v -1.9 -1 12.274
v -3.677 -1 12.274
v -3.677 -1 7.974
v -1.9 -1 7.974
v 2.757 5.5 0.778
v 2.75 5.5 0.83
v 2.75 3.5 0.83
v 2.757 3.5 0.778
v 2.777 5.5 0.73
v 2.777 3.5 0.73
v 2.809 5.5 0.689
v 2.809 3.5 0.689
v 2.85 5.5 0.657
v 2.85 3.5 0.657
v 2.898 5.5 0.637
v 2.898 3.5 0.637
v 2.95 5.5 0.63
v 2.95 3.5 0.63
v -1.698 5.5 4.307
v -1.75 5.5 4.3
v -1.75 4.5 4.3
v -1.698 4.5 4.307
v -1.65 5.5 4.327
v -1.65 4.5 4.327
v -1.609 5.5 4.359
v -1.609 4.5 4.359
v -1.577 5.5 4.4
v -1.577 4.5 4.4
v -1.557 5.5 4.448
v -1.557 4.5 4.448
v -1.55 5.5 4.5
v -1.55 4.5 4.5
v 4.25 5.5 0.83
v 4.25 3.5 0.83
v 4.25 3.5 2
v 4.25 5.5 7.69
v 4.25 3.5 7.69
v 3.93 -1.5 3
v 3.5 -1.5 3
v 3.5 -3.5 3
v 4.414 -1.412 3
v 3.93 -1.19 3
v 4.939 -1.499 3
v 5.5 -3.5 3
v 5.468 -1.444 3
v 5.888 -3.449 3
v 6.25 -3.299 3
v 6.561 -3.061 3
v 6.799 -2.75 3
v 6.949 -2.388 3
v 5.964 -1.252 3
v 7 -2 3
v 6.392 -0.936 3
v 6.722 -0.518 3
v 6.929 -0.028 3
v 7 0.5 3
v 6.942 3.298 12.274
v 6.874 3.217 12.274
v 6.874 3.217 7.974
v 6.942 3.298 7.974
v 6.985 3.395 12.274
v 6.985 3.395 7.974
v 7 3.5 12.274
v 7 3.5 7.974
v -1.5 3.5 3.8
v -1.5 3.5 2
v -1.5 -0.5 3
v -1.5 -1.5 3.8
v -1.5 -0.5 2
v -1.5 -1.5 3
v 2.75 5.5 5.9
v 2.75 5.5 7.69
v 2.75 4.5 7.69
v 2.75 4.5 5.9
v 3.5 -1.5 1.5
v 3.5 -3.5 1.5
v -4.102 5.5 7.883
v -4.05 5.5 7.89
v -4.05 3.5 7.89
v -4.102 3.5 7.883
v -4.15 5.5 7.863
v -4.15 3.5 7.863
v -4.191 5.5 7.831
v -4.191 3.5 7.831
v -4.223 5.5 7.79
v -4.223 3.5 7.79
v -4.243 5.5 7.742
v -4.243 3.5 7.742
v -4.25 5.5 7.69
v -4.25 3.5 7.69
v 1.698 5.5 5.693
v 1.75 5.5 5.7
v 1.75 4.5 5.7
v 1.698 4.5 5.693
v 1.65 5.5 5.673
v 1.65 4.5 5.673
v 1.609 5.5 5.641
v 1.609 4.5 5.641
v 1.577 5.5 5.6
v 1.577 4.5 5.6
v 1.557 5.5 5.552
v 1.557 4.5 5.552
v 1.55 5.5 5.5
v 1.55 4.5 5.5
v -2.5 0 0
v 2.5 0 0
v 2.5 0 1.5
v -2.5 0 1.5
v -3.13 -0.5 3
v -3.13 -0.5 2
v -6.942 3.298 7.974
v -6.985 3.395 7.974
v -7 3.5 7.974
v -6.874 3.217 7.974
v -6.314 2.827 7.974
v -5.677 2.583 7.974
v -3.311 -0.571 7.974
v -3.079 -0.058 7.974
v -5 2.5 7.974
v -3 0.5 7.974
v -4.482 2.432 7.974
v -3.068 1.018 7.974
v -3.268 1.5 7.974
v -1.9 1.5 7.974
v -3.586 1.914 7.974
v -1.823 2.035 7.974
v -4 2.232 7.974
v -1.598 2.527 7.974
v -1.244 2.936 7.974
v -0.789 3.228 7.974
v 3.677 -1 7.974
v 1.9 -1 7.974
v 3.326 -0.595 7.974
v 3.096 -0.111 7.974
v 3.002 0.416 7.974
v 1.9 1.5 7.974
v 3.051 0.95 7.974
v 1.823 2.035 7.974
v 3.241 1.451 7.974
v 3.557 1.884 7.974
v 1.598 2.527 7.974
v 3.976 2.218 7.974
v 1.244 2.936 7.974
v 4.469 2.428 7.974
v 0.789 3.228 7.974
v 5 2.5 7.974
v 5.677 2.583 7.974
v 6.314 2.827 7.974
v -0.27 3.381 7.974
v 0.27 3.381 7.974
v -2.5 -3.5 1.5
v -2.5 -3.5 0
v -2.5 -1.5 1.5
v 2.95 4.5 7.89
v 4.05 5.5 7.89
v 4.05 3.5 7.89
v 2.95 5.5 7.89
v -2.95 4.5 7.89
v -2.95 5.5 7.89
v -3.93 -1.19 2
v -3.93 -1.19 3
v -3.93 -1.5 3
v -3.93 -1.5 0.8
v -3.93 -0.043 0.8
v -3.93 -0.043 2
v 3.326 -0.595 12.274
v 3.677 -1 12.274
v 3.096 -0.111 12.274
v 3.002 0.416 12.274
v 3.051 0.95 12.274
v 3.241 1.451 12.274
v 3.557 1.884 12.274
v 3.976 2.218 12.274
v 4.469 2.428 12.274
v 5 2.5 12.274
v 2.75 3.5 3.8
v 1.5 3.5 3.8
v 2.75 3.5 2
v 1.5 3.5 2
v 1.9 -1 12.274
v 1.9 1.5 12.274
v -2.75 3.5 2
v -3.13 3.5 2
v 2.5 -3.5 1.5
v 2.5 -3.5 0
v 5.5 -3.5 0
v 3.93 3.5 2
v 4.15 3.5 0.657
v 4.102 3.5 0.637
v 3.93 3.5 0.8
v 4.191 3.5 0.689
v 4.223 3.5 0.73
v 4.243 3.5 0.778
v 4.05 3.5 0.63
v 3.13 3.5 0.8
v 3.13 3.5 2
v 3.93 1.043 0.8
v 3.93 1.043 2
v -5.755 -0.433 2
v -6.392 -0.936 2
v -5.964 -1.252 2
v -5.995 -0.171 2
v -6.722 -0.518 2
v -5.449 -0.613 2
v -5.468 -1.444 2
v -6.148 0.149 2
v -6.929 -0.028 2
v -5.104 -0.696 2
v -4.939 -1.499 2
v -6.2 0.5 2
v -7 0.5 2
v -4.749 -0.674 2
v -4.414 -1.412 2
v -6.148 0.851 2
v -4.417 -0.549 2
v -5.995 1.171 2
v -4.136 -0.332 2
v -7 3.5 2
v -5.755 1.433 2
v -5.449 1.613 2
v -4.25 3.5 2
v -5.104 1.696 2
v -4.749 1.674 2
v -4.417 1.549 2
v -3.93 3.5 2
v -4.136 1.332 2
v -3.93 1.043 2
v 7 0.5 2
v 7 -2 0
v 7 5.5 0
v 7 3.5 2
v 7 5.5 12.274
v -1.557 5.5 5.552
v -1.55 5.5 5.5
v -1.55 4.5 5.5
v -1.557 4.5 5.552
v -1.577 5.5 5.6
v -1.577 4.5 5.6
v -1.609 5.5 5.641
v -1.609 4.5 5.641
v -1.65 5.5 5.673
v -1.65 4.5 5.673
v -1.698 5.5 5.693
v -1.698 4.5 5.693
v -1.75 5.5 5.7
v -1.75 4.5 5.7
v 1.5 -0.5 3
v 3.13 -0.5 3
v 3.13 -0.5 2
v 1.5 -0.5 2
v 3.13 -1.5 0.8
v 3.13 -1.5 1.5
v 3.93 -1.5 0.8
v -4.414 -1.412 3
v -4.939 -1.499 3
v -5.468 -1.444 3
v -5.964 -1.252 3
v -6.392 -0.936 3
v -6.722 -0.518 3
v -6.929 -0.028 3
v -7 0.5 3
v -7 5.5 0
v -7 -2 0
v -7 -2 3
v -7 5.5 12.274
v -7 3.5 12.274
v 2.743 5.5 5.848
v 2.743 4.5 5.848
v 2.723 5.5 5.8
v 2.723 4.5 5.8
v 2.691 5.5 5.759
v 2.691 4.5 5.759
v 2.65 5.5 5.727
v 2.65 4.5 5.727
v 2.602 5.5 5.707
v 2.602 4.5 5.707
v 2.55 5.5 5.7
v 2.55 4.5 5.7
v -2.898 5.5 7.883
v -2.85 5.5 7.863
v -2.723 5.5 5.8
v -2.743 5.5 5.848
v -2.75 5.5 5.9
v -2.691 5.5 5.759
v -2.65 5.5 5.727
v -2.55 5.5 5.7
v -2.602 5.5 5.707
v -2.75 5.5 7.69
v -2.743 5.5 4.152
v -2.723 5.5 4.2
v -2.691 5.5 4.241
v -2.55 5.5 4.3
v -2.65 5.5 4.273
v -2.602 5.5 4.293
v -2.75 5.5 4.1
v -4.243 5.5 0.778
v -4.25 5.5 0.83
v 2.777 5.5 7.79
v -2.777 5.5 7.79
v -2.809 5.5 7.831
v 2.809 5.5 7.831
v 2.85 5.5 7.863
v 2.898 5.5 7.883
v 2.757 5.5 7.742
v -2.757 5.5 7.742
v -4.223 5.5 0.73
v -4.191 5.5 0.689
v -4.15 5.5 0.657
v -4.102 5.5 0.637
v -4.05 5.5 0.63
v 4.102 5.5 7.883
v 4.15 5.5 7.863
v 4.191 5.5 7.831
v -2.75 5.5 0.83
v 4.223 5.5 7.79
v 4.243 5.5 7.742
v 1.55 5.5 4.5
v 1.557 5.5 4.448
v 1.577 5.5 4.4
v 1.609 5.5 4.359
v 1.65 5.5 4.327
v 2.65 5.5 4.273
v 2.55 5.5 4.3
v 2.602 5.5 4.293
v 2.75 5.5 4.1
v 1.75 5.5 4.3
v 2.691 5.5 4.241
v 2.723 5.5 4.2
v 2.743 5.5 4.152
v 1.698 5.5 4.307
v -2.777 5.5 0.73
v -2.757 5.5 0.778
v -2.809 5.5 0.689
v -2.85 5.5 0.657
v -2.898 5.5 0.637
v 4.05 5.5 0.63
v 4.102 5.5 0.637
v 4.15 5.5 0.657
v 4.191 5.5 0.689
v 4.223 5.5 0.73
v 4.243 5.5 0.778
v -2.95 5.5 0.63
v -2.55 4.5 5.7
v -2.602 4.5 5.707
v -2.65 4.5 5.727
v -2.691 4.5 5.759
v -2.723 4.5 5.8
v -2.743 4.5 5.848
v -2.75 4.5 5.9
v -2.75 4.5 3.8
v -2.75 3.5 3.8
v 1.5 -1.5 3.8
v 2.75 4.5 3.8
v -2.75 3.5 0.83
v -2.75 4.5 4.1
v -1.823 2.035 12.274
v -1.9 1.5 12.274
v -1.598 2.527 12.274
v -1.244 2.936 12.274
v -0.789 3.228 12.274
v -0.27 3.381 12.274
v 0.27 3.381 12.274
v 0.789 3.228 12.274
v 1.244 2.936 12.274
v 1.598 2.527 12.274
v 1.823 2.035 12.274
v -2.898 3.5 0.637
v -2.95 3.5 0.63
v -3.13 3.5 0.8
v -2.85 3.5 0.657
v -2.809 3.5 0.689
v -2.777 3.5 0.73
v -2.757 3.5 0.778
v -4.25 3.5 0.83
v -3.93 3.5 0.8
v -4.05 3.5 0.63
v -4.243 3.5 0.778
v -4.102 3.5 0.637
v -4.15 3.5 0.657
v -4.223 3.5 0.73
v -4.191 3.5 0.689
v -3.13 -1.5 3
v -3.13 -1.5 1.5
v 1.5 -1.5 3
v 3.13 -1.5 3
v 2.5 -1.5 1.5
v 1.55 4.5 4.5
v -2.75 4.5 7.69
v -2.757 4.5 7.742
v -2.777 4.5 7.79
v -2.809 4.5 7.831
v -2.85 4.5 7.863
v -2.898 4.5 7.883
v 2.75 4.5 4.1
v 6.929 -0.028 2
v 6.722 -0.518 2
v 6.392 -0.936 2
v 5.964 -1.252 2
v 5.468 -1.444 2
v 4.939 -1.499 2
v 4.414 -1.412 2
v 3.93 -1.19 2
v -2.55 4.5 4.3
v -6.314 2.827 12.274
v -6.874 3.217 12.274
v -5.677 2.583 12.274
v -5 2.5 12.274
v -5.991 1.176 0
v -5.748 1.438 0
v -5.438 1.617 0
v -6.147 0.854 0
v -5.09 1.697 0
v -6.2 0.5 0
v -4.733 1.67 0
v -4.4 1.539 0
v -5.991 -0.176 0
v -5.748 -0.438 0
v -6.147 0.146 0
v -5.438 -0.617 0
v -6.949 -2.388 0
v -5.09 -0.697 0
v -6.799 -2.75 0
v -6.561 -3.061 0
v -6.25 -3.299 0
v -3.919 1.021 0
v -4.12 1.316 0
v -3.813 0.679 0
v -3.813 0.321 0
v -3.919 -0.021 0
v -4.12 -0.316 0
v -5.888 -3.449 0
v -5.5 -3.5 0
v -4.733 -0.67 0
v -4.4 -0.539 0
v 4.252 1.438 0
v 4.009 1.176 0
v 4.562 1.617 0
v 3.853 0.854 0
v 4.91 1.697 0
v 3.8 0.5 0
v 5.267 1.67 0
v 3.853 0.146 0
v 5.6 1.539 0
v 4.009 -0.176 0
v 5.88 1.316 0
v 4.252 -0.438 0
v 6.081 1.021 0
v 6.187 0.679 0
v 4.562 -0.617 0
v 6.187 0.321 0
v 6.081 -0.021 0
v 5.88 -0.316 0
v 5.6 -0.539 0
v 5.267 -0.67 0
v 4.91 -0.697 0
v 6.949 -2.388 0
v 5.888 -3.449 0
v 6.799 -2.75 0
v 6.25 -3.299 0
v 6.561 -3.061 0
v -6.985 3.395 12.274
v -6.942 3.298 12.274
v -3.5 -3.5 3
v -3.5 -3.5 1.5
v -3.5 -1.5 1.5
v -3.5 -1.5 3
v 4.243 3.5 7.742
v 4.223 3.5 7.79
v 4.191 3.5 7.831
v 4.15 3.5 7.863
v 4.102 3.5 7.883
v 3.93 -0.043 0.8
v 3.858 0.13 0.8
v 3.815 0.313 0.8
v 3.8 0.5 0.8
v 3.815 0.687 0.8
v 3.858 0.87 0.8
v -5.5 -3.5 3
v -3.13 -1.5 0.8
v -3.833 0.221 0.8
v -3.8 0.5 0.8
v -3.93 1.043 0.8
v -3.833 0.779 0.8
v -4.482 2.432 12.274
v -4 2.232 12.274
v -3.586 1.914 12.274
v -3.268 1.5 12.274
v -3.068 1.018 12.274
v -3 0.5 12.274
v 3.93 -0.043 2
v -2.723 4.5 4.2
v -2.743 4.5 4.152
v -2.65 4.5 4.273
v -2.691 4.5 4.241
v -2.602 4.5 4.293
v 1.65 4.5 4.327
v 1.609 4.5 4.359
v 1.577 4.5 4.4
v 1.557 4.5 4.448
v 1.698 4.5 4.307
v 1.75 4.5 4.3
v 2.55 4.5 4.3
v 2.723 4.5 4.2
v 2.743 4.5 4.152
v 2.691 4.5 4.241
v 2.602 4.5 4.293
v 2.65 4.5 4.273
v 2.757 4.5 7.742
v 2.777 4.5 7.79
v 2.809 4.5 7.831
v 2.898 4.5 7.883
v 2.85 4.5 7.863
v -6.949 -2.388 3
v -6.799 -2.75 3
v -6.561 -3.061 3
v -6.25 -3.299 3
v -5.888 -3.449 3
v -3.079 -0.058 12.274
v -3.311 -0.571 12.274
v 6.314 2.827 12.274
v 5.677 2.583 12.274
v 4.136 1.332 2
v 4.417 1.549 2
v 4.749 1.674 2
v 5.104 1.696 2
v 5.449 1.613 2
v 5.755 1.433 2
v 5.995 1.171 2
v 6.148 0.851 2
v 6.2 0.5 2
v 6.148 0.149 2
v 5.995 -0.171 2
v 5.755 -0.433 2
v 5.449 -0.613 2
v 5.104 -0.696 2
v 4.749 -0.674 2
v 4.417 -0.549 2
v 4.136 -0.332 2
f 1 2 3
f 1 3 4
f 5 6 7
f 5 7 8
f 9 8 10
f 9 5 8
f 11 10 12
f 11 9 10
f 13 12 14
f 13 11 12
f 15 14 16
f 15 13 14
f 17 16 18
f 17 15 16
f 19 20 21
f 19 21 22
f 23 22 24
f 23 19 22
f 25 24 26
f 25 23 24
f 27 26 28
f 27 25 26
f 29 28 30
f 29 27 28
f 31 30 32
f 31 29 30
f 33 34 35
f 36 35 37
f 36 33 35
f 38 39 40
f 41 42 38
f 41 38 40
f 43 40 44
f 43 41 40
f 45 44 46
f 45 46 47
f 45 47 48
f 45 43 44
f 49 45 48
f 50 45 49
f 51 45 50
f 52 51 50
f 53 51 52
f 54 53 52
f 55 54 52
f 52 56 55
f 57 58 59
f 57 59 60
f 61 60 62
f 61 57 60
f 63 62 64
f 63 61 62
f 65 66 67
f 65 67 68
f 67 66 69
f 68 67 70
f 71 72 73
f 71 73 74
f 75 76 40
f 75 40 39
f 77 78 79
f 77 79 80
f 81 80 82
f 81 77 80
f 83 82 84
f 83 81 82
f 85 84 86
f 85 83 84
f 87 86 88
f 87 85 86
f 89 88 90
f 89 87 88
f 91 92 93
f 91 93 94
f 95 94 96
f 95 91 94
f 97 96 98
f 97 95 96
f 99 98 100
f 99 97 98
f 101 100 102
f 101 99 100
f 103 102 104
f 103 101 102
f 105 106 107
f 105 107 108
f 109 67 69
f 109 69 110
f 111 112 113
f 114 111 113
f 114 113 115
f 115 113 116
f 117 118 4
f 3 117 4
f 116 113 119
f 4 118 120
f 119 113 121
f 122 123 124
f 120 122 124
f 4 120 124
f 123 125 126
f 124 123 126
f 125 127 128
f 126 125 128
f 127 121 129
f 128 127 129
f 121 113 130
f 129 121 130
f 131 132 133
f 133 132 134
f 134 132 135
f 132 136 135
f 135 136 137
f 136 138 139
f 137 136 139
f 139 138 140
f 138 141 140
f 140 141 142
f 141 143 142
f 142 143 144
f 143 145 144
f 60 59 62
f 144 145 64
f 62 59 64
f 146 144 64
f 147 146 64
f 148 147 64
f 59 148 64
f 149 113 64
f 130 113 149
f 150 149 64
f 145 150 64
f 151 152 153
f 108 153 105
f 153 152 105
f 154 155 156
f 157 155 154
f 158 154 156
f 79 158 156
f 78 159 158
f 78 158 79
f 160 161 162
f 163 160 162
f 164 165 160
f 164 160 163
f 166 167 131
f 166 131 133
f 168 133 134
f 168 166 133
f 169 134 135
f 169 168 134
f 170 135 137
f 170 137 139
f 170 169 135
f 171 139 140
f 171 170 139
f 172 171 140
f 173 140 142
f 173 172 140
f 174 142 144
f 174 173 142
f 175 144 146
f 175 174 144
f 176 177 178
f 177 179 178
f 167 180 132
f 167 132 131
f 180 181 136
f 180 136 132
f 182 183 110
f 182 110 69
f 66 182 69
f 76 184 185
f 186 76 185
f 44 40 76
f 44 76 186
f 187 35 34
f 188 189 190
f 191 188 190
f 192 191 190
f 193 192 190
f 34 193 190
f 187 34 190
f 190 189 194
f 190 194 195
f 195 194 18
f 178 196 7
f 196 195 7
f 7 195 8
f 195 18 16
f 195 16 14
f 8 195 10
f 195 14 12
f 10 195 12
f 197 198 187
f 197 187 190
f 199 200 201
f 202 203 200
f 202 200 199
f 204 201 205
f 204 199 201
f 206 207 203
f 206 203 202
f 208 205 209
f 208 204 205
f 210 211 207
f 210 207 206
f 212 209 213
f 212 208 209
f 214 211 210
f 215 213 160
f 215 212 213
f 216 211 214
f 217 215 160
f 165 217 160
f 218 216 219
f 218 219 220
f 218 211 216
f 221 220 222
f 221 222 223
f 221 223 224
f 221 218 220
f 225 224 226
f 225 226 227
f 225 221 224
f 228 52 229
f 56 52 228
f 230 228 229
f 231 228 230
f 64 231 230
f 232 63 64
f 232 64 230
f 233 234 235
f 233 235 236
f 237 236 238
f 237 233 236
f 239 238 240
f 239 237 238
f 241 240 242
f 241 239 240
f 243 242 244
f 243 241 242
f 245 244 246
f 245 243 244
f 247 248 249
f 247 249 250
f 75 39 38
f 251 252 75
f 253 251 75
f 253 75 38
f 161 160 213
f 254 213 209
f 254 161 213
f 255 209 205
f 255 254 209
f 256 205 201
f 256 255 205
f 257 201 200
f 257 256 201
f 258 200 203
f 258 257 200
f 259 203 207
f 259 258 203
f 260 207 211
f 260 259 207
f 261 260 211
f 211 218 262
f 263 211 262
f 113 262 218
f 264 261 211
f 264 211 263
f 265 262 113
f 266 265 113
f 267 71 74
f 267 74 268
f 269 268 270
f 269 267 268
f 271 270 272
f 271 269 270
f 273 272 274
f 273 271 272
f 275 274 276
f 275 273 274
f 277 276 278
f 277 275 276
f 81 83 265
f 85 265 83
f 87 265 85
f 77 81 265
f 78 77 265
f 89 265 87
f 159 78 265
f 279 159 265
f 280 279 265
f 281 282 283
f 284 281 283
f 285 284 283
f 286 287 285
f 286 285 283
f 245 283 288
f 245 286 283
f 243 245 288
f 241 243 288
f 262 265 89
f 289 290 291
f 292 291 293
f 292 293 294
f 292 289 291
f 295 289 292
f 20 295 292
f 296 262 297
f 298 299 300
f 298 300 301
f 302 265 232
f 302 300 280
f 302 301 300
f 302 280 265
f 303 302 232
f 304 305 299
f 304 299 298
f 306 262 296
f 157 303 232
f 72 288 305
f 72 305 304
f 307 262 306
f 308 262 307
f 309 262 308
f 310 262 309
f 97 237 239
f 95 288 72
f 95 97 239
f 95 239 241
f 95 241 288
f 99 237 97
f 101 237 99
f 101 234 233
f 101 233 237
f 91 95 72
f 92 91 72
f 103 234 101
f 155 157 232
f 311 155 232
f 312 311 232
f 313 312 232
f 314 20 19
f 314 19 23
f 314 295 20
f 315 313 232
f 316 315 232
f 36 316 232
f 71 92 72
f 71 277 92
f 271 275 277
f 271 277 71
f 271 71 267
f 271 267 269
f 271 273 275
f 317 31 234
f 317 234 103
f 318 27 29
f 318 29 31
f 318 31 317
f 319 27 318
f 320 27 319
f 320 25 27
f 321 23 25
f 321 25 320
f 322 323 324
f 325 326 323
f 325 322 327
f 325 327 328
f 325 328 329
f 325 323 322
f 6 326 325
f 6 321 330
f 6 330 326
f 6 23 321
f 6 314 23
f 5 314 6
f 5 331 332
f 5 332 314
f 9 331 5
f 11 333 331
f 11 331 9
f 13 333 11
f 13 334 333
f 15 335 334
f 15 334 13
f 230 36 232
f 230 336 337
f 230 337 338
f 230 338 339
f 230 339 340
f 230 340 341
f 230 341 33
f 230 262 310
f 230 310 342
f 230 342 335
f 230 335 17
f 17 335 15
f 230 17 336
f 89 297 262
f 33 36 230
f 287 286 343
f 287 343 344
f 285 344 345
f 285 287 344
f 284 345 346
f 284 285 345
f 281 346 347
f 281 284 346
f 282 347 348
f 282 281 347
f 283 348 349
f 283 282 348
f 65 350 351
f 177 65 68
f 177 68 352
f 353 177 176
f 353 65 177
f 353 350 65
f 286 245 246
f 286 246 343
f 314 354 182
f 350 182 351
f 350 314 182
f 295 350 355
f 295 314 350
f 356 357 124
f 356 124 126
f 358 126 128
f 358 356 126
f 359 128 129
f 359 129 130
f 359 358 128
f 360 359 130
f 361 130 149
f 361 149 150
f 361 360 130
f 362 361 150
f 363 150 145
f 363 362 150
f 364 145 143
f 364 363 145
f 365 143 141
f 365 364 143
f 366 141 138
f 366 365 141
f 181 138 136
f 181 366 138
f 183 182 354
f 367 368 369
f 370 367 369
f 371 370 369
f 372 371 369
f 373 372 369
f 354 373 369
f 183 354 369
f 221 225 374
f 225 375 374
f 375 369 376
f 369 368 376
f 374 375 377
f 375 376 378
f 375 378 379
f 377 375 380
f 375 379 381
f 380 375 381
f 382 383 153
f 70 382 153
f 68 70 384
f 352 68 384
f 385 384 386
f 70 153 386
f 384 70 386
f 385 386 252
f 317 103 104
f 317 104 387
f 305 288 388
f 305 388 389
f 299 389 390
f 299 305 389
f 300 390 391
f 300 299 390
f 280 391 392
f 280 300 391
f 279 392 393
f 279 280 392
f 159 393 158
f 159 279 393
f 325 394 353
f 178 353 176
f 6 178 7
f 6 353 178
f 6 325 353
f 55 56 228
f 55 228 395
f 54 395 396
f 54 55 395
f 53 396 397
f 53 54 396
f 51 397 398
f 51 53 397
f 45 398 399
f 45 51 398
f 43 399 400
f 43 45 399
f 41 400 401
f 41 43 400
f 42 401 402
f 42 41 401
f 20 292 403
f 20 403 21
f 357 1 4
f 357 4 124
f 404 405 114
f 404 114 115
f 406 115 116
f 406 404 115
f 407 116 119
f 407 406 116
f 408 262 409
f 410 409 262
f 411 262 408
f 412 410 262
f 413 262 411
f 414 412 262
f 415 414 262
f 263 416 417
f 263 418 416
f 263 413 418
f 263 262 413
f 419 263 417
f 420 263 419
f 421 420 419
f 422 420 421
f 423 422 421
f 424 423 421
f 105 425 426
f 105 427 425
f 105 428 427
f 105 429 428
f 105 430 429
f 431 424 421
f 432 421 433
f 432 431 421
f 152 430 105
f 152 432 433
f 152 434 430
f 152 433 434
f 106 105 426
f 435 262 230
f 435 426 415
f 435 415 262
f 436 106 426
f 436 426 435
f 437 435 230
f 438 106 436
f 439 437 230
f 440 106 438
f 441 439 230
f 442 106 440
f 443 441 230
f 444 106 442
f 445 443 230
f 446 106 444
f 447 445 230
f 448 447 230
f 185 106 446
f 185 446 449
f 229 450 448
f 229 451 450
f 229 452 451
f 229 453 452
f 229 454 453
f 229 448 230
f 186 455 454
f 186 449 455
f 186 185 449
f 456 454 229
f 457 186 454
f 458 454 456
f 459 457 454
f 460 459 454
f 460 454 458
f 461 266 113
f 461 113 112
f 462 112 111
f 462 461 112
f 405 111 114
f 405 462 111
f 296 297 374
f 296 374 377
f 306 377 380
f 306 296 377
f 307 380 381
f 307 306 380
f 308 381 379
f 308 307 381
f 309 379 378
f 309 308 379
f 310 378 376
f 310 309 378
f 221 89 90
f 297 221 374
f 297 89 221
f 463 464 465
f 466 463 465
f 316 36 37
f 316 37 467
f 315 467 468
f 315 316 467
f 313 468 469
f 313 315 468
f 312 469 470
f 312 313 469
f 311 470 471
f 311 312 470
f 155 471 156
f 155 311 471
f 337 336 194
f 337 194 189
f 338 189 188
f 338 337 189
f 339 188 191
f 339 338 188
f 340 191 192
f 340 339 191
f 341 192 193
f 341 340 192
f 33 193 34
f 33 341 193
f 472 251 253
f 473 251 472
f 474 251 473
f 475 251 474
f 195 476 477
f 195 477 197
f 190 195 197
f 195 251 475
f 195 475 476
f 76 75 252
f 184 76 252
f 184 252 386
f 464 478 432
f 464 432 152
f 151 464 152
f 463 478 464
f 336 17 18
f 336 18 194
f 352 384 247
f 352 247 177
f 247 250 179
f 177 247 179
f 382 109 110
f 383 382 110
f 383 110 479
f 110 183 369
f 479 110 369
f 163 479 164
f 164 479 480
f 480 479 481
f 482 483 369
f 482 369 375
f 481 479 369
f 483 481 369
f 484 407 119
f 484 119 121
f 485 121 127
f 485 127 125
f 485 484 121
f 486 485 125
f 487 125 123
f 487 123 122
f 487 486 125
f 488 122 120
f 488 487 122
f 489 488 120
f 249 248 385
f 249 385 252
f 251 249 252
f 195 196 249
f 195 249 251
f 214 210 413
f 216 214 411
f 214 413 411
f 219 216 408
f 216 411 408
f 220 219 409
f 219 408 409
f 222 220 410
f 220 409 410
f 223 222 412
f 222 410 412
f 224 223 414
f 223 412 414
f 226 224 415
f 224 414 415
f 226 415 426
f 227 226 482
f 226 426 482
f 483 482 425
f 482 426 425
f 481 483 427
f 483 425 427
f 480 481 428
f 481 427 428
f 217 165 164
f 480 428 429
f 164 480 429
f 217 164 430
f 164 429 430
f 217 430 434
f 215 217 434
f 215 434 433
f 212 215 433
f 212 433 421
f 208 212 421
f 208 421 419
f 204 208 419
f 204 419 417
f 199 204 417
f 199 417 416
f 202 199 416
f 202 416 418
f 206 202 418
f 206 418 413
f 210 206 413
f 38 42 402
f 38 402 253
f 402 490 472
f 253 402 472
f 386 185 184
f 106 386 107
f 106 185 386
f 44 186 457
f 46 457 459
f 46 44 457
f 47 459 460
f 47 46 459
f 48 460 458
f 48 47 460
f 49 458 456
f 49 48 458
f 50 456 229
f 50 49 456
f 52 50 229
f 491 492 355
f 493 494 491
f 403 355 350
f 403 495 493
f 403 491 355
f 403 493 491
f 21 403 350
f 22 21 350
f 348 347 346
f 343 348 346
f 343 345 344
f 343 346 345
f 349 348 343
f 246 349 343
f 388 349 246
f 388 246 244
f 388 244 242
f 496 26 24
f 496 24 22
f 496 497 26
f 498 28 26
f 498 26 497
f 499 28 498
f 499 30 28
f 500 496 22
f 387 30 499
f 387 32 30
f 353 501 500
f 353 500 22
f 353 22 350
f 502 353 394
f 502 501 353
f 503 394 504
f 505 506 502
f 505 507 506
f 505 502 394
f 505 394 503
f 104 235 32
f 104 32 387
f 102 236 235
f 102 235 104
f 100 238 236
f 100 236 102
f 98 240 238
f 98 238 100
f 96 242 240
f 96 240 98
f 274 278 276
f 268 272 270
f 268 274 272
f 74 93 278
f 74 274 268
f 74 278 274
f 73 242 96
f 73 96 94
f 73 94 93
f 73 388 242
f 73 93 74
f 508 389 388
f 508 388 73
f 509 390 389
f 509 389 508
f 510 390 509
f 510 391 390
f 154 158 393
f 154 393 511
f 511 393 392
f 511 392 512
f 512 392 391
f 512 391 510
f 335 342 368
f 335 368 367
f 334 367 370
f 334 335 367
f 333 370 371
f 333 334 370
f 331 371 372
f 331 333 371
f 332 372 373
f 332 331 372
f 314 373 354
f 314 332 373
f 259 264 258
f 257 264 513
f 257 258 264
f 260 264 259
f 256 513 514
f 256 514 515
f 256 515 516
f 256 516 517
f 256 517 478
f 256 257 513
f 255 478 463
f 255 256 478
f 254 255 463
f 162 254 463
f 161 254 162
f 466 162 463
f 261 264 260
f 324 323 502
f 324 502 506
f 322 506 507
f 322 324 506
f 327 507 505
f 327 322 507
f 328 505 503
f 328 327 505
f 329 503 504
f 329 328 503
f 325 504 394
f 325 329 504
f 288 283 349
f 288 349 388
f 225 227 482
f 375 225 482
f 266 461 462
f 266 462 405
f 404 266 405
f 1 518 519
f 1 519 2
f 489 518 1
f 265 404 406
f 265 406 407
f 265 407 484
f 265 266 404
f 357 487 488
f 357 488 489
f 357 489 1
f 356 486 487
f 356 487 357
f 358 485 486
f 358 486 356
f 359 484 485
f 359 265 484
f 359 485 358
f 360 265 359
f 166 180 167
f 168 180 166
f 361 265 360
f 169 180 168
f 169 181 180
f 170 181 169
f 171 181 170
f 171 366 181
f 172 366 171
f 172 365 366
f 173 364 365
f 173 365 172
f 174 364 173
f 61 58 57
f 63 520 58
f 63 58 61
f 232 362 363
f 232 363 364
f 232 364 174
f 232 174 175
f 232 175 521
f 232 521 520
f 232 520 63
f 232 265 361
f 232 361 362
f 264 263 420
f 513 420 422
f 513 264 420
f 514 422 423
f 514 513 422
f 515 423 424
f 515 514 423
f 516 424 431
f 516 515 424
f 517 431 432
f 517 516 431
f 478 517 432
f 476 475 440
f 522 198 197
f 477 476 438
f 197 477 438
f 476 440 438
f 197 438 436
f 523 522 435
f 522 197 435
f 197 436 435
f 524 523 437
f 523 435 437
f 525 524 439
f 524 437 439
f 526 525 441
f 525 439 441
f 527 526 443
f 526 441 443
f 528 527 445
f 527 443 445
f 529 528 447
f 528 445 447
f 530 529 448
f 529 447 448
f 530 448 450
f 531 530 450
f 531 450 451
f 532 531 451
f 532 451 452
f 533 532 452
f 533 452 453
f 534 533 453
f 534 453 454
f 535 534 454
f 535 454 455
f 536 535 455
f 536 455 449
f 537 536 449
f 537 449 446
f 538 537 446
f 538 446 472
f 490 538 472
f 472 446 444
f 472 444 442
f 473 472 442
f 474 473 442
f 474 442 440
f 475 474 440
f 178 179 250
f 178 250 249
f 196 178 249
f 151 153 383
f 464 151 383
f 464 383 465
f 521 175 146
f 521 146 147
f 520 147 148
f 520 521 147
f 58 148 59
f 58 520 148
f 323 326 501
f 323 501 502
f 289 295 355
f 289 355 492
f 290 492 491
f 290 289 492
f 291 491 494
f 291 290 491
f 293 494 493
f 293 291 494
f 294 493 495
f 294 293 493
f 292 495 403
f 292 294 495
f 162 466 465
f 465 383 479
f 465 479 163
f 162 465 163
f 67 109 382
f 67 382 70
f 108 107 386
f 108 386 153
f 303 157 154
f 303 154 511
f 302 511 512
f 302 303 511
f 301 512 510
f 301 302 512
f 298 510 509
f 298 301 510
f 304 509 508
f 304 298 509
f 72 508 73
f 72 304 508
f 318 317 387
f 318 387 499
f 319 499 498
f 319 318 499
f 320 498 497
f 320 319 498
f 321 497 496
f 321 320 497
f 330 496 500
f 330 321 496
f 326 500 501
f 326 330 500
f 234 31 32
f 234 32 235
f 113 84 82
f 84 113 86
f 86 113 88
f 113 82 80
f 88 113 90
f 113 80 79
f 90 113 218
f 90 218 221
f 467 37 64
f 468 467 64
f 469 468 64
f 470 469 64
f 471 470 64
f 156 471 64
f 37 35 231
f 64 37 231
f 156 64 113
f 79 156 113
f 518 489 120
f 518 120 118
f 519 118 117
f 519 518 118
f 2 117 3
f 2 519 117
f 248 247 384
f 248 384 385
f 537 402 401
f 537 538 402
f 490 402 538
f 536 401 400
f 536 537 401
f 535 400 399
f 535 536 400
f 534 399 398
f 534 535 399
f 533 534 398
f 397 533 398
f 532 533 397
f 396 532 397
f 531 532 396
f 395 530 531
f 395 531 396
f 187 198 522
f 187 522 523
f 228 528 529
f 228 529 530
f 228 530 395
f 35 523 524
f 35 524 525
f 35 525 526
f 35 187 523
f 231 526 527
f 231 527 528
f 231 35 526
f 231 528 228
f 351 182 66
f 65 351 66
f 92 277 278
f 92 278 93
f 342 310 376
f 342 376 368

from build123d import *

# Parameters (mm, degrees)
SKETCH1_W            = 14
SKETCH1_H            = 7
BOSS_EXTRUDE1_DEPTH  = 2
FILLET1_R            = 1.5
M2_CLEARANCE_HOLE1_D = 2.4
SKETCH4_W            = 14
SKETCH4_H            = 12.27377735
BOSS_EXTRUDE2_DEPTH  = 2
BOSS_EXTRUDE3_START  = 1
BOSS_EXTRUDE3_DEPTH  = 1
SKETCH6_W            = 5
SKETCH6_H            = 3.5
CUT_EXTRUDE1_DEPTH   = 1.5
CUT_EXTRUDE2_REACH   = 15.976
SKETCH7_W            = 7
SKETCH7_H            = 2
SKETCH8_W            = 3
SKETCH8_H            = 4
SKETCH8_H_2          = 1
BOSS_EXTRUDE4_DEPTH  = 1.8
CUT_EXTRUDE3_DEPTH   = 2
SKETCH10_W           = 8.1
SKETCH10_H           = 4.09
CUT_EXTRUDE4_DEPTH   = 1
BOSS_EXTRUDE5_DEPTH  = 4.3
SKETCH13_W           = 0.8
SKETCH13_H           = 2.2
CUT_EXTRUDE5_DEPTH   = 5


with BuildPart() as part:
    # Sketch1 → Boss-Extrude1 (new body)
    with BuildSketch(Plane.XY):
        Rectangle(SKETCH1_W, SKETCH1_H)
    extrude(amount=BOSS_EXTRUDE1_DEPTH)

    # Fillet1
    fillet1_edges = [part.edges().sort_by_distance(p)[0] for p in [
        (7, -3.5, 1),
        (-7, -3.5, 1),
    ]]
    fillet(fillet1_edges, radius=FILLET1_R)

    # M2 Clearance Hole1 (through all)
    with Locations(Plane.XY.offset(2)):
        with Locations((-5, 0.5), (5, 0.5)):
            Hole(M2_CLEARANCE_HOLE1_D / 2)

    # Sketch4 → Boss-Extrude2 (add)
    with BuildSketch(Plane(origin=(0, 3.5, 0), x_dir=(1, 0, 0), z_dir=(0, 1, 0))):
        with Locations((0, -6.136888675)):
            Rectangle(SKETCH4_W, SKETCH4_H)
    extrude(amount=BOSS_EXTRUDE2_DEPTH)

    # Sketch5 → Boss-Extrude3 (add)
    with BuildSketch(Plane.XY.offset(2).offset(BOSS_EXTRUDE3_START)):
        with BuildLine():
            ThreePointArc((-7, -2), (-6.560660172, -3.060660172), (-5.5, -3.5))
            Line((-5.5, -3.5), (5.5, -3.5))
            ThreePointArc((5.5, -3.5), (6.560660172, -3.060660172), (7, -2))
            Line((7, -2), (7, 0.5))
            ThreePointArc((7, 0.5), (5.51763809, -1.431851653), (3.267949192, -0.5))
            Line((3.267949192, -0.5), (-3.267949192, -0.5))
            ThreePointArc((-3.267949192, -0.5), (-5.51763809, -1.431851653), (-7, 0.5))
            Line((-7, 0.5), (-7, -2))
        make_face()
    extrude(amount=-BOSS_EXTRUDE3_DEPTH)

    # Sketch6 → Cut-Extrude1 (cut)
    with BuildSketch(Plane(origin=(0, 0, 0), x_dir=(-1, 0, 0), z_dir=(0, 0, -1))):
        with Locations((0, -1.75)):
            Rectangle(SKETCH6_W, SKETCH6_H)
    extrude(amount=-CUT_EXTRUDE1_DEPTH, mode=Mode.SUBTRACT)

    # Sketch7 → Cut-Extrude2 (cut, up to next)
    with BuildSketch(Plane(origin=(0, 0, 1.5), x_dir=(-1, 0, 0), z_dir=(0, 0, -1)), mode=Mode.PRIVATE) as cut_extrude2_sk1:
        with Locations((0, -2.5)):
            Rectangle(SKETCH7_W, SKETCH7_H)
    cut_extrude2_tool1 = extrude(cut_extrude2_sk1.sketch, amount=-CUT_EXTRUDE2_REACH, mode=Mode.PRIVATE) & part.part
    add(cut_extrude2_tool1.solids().sort_by_distance((0, -2.5, 1.5))[0], mode=Mode.SUBTRACT)

    # Sketch8 → Boss-Extrude4 (add)
    with BuildSketch(Plane.XY.offset(2)):
        with Locations((0, 1.5)):
            Rectangle(SKETCH8_W, SKETCH8_H)
        with Locations((0, -1)):
            Rectangle(SKETCH8_W, SKETCH8_H_2)
    extrude(amount=BOSS_EXTRUDE4_DEPTH)

    # Sketch9 → Cut-Extrude3 (cut)
    with BuildSketch(Plane(origin=(0, 5.5, 0), x_dir=(1, 0, 0), z_dir=(0, 1, 0))):
        with BuildLine():
            Line((-2.95, -7.89), (-4.05, -7.89))
            ThreePointArc((-4.05, -7.89), (-4.191421356, -7.831421356), (-4.25, -7.69))
            Line((-4.25, -7.69), (-4.25, -0.83))
            ThreePointArc((-4.25, -0.83), (-4.191421356, -0.688578644), (-4.05, -0.63))
            Line((-4.05, -0.63), (-2.95, -0.63))
            ThreePointArc((-2.95, -0.63), (-2.808578644, -0.688578644), (-2.75, -0.83))
            Line((-2.75, -0.83), (-2.75, -4.1))
            ThreePointArc((-2.75, -4.1), (-2.691421356, -4.241421356), (-2.55, -4.3))
            Line((-2.55, -4.3), (-1.75, -4.3))
            ThreePointArc((-1.75, -4.3), (-1.608578644, -4.358578644), (-1.55, -4.5))
            Line((-1.55, -4.5), (-1.55, -5.5))
            ThreePointArc((-1.55, -5.5), (-1.608578644, -5.641421356), (-1.75, -5.7))
            Line((-1.75, -5.7), (-2.55, -5.7))
            ThreePointArc((-2.55, -5.7), (-2.691421356, -5.758578644), (-2.75, -5.9))
            Line((-2.75, -5.9), (-2.75, -7.69))
            ThreePointArc((-2.75, -7.69), (-2.808578644, -7.831421356), (-2.95, -7.89))
        make_face()
        with BuildLine():
            Line((2.75, -4.1), (2.75, -0.83))
            ThreePointArc((2.75, -0.83), (2.808578644, -0.688578644), (2.95, -0.63))
            Line((2.95, -0.63), (4.05, -0.63))
            ThreePointArc((4.05, -0.63), (4.191421356, -0.688578644), (4.25, -0.83))
            Line((4.25, -0.83), (4.25, -7.69))
            ThreePointArc((4.25, -7.69), (4.191421356, -7.831421356), (4.05, -7.89))
            Line((4.05, -7.89), (2.95, -7.89))
            ThreePointArc((2.95, -7.89), (2.808578644, -7.831421356), (2.75, -7.69))
            Line((2.75, -7.69), (2.75, -5.9))
            ThreePointArc((2.75, -5.9), (2.691421356, -5.758578644), (2.55, -5.7))
            Line((2.55, -5.7), (1.75, -5.7))
            ThreePointArc((1.75, -5.7), (1.608578644, -5.641421356), (1.55, -5.5))
            Line((1.55, -5.5), (1.55, -4.5))
            ThreePointArc((1.55, -4.5), (1.608578644, -4.358578644), (1.75, -4.3))
            Line((1.75, -4.3), (2.55, -4.3))
            ThreePointArc((2.55, -4.3), (2.691421356, -4.241421356), (2.75, -4.1))
        make_face()
    extrude(amount=-CUT_EXTRUDE3_DEPTH, mode=Mode.SUBTRACT)

    # Sketch10 → Cut-Extrude4 (cut)
    with BuildSketch(Plane.XZ.offset(-3.5)):
        with Locations((0, 5.845)):
            Rectangle(SKETCH10_W, SKETCH10_H)
    extrude(amount=-CUT_EXTRUDE4_DEPTH, mode=Mode.SUBTRACT)

    # Sketch12 → Boss-Extrude5 (add)
    with BuildSketch(Plane.XY.offset(12.27377735)):
        with BuildLine():
            Line((7, 3.5), (-7, 3.5))
            ThreePointArc((-7, 3.5), (-6.966992395, 3.345092681), (-6.873703802, 3.217096517))
            ThreePointArc((-6.873703802, 3.217096517), (-6.003119304, 2.685397947), (-5, 2.5))
            ThreePointArc((-5, 2.5), (-3.585786438, 1.914213562), (-3, 0.5))
            ThreePointArc((-3, 0.5), (-3.177124344, -0.322875656), (-3.677124344, -1))
            Line((-3.677124344, -1), (-1.9, -1))
            Line((-1.9, -1), (-1.9, 1.5))
            ThreePointArc((-1.9, 1.5), (0, 3.4), (1.9, 1.5))
            Line((1.9, 1.5), (1.9, -1))
            Line((1.9, -1), (3.677124344, -1))
            ThreePointArc((3.677124344, -1), (3.129171307, 1.207106781), (5, 2.5))
            ThreePointArc((5, 2.5), (6.003119304, 2.685397947), (6.873703802, 3.217096517))
            ThreePointArc((6.873703802, 3.217096517), (6.966992395, 3.345092681), (7, 3.5))
        make_face()
    extrude(amount=-BOSS_EXTRUDE5_DEPTH)

    # Sketch13 → Cut-Extrude5 (cut)
    with BuildSketch(Plane(origin=(0, 3.5, 0), x_dir=(1, 0, 0), z_dir=(0, 1, 0))):
        with Locations((3.53, -1.9)):
            Rectangle(SKETCH13_W, SKETCH13_H)
    cut_extrude5 = extrude(amount=-CUT_EXTRUDE5_DEPTH, mode=Mode.SUBTRACT)

    # Mirror1: Cut-Extrude5 across plane
    add(cut_extrude5.mirror(Plane(origin=(0, 0, 0), x_dir=(0, 0, 1), z_dir=(1, 0, 0))), mode=Mode.SUBTRACT)


solid = part.part
